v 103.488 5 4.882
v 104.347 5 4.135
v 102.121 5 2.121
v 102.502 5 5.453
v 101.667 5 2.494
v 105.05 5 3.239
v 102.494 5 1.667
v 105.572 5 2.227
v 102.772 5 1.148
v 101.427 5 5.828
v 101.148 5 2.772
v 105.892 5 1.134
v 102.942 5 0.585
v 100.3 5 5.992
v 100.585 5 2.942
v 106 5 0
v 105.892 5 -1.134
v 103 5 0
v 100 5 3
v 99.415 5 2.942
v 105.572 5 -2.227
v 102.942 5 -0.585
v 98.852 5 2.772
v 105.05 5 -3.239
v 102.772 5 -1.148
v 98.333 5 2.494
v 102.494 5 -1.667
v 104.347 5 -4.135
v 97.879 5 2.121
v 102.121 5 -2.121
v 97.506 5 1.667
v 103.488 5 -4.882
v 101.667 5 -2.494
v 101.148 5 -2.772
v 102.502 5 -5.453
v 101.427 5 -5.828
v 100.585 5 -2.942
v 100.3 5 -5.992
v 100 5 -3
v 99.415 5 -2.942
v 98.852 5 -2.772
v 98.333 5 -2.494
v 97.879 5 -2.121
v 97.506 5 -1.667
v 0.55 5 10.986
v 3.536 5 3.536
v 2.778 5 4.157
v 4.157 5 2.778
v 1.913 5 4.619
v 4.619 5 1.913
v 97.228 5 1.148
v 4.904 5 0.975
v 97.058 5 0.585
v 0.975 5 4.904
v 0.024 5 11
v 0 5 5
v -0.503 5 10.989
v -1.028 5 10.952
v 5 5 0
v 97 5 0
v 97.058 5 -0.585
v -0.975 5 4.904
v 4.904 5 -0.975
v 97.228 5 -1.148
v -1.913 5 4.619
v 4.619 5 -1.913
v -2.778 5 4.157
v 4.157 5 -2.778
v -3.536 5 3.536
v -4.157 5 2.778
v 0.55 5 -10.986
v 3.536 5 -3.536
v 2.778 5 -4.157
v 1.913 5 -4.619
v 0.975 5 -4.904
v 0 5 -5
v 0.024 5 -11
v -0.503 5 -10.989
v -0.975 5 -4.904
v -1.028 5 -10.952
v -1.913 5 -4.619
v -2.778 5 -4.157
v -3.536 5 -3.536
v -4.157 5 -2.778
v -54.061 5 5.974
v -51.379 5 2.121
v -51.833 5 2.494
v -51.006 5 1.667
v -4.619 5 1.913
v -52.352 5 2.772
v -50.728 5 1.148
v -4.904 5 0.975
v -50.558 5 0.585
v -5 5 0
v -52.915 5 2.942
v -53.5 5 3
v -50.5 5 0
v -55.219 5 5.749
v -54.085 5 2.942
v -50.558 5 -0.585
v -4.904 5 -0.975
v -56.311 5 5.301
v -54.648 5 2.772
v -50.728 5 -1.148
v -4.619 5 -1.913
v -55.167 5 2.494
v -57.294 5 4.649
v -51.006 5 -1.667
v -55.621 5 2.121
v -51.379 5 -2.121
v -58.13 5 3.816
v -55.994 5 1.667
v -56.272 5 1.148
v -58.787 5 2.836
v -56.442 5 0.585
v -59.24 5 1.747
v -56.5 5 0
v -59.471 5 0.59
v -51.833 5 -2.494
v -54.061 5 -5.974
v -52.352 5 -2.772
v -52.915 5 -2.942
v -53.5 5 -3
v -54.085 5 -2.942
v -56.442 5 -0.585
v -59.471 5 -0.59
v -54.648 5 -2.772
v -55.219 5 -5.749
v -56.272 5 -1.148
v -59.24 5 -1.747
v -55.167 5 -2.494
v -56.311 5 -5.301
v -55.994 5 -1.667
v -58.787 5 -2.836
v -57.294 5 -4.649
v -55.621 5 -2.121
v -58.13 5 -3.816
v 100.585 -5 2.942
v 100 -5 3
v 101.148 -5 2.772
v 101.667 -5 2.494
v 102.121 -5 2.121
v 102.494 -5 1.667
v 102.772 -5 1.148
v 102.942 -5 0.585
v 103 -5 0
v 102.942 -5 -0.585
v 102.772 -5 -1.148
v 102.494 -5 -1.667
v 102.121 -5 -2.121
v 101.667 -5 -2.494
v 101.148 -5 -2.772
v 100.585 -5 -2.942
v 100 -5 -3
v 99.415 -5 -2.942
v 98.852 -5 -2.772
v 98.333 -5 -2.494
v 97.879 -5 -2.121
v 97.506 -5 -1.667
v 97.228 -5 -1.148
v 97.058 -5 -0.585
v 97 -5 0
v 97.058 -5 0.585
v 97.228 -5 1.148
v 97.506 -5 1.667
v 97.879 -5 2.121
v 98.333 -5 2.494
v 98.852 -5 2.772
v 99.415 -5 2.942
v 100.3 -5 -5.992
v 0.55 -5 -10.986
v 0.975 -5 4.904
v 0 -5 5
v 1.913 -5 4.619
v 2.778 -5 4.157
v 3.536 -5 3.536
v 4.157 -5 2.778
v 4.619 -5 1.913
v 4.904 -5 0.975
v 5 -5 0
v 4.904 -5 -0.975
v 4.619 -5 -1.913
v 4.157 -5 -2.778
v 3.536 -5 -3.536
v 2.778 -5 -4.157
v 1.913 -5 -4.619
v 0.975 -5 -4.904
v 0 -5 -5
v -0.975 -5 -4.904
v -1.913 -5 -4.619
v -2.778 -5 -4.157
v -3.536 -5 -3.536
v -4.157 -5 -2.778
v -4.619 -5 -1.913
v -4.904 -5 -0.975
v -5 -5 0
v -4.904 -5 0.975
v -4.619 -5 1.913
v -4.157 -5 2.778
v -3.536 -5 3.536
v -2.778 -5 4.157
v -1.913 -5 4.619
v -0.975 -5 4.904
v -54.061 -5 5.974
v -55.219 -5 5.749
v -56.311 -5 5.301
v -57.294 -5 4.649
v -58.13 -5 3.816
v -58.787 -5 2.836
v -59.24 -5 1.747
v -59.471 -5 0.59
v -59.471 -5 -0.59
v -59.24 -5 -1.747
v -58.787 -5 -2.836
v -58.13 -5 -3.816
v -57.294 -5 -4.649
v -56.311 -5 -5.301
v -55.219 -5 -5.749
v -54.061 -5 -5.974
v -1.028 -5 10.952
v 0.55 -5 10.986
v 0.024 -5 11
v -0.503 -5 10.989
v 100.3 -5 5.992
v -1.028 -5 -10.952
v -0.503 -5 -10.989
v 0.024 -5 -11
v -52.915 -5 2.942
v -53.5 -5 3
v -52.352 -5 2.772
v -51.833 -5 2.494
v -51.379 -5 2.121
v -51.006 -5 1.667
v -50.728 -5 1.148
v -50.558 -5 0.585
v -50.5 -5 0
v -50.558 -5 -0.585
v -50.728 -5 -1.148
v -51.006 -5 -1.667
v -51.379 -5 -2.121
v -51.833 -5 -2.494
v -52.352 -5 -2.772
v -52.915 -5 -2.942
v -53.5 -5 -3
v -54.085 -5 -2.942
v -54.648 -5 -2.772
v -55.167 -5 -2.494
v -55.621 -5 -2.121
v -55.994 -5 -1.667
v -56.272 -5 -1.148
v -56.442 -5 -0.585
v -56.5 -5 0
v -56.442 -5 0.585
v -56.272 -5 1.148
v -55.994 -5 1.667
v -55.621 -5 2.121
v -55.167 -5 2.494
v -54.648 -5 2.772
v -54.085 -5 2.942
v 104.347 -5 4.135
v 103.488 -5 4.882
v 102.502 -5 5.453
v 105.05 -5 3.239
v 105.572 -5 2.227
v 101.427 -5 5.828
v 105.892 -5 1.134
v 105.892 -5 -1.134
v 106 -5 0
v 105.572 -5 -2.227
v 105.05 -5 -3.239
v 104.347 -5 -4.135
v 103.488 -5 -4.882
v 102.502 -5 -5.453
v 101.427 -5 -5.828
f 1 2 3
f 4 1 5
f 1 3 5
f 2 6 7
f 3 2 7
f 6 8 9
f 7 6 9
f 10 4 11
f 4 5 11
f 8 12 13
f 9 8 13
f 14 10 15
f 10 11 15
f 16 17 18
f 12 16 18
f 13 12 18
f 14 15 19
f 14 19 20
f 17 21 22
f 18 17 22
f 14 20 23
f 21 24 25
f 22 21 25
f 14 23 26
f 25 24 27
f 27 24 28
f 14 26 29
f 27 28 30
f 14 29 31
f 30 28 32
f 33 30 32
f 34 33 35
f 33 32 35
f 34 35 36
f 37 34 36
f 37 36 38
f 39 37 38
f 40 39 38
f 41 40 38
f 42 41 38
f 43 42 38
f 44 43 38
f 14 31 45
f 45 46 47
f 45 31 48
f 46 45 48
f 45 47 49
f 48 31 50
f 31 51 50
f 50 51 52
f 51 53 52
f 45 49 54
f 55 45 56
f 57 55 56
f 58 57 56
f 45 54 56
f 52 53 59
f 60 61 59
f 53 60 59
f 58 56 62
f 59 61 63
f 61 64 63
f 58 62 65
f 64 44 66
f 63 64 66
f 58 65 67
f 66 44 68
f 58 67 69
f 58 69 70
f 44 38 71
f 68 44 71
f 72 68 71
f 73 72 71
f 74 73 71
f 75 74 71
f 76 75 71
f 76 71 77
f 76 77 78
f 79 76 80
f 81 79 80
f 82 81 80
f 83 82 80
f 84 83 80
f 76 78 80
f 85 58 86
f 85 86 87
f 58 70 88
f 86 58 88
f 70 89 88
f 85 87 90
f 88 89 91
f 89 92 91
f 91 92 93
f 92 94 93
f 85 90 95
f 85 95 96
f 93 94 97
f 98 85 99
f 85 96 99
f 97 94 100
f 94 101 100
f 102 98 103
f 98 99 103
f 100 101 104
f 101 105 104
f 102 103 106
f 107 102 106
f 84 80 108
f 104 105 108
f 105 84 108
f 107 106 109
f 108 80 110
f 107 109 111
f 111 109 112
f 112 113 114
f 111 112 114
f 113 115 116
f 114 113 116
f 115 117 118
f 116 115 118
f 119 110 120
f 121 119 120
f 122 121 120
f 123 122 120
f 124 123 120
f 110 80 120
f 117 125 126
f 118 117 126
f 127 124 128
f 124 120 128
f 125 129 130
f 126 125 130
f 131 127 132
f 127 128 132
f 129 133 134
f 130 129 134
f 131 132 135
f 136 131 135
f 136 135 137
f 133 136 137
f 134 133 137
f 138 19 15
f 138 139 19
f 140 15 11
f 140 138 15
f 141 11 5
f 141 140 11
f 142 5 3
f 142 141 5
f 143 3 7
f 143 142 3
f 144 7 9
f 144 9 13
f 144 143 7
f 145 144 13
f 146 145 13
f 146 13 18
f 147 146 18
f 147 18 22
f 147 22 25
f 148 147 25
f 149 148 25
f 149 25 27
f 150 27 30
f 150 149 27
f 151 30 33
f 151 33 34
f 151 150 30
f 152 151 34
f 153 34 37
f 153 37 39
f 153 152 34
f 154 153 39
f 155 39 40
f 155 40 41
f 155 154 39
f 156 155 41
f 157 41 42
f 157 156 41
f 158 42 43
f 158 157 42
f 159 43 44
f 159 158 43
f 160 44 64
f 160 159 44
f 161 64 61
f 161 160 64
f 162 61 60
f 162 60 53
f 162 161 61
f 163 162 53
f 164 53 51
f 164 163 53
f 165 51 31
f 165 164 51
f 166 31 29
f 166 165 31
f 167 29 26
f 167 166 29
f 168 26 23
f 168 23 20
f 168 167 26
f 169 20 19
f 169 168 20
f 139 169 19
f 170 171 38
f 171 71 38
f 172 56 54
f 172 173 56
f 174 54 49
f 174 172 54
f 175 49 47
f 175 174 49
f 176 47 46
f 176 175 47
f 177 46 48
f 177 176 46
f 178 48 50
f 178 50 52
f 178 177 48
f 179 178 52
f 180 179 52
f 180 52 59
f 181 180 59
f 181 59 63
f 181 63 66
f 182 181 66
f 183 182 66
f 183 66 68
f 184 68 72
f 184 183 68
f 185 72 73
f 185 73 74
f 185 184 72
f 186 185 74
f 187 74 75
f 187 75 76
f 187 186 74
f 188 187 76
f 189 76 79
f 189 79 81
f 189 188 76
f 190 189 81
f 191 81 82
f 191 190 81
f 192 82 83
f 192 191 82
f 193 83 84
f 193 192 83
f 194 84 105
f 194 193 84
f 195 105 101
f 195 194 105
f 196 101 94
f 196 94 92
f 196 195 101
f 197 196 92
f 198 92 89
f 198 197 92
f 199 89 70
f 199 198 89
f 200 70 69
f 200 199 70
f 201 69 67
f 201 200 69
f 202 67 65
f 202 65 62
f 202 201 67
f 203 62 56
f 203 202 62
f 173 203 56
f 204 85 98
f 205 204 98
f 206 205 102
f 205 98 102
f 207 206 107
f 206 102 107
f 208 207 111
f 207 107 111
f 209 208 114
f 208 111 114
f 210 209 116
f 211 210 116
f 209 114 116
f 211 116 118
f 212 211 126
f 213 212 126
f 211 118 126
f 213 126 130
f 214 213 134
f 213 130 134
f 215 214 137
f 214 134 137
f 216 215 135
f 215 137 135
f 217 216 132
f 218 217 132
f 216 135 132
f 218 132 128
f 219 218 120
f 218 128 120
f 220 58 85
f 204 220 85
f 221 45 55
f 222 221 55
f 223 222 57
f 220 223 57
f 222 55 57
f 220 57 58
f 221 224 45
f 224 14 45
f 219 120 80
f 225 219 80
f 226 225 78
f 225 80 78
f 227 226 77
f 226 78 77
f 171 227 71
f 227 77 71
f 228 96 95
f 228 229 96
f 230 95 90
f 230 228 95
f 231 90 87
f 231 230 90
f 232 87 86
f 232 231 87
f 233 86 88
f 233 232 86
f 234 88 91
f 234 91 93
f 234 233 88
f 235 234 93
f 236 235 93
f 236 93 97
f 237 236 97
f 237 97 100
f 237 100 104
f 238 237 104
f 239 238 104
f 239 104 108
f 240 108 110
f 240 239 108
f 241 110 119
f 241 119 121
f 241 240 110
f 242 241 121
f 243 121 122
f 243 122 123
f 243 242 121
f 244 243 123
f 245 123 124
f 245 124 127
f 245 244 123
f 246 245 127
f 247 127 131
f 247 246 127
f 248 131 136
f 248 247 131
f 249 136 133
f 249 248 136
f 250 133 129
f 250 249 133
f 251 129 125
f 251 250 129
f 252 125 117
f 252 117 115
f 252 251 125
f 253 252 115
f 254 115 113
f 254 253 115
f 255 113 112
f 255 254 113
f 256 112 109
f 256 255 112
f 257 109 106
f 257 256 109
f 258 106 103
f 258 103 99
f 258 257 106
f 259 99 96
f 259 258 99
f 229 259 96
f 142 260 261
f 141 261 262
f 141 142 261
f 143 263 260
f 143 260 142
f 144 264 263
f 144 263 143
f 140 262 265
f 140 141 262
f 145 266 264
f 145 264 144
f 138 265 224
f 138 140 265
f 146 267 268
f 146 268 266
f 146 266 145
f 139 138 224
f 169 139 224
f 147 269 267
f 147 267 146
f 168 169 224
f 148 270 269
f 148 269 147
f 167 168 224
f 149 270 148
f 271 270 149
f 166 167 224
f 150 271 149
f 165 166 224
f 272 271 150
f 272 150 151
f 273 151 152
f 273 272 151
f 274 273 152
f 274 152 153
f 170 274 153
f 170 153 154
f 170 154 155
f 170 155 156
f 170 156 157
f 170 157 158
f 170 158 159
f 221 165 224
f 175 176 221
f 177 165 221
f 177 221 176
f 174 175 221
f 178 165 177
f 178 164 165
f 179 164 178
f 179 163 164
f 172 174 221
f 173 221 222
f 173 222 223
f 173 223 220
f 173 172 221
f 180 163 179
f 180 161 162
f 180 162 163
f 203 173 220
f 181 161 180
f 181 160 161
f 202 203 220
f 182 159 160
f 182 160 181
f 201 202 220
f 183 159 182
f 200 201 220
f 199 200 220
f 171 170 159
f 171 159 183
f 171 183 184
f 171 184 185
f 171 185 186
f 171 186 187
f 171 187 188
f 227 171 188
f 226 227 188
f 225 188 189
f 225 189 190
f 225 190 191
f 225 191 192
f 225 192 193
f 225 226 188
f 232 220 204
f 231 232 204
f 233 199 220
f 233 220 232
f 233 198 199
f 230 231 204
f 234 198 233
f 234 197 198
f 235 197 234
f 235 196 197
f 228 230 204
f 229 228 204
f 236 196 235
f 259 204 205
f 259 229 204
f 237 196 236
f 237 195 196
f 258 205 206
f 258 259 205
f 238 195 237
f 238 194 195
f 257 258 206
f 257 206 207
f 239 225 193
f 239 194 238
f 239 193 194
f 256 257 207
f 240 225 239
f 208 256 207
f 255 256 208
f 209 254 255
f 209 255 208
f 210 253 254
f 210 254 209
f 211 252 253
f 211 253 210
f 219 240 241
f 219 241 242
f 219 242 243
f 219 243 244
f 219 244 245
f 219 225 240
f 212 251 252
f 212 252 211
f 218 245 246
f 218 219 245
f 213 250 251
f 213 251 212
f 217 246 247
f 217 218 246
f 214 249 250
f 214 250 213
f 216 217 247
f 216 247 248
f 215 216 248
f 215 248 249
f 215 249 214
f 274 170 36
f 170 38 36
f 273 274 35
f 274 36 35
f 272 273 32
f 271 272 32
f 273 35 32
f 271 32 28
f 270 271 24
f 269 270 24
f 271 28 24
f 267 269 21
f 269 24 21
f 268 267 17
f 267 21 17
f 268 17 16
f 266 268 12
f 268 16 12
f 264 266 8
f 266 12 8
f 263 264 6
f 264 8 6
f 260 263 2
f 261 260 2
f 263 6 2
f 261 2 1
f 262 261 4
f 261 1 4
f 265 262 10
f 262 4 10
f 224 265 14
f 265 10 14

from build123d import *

# Parameters (mm, degrees)
SKETCH_1_R      = 3
SKETCH_1_R_2    = 5
EXTRUDE_1_DEPTH = 5


with BuildPart() as part:
    # 草图1 → 凸台-拉伸1 (new, symmetric)
    with BuildSketch(Plane(origin=(0, 0, 0), x_dir=(1, 0, 0), z_dir=(0, 1, 0))):
        with BuildLine():
            Line((-54.060747664, 5.97373937), (-1.028037383, 10.951855511))
            ThreePointArc((-1.028037383, 10.951855511), (-0.23963625, 10.997389439), (0.55, 10.986241395))
            Line((0.55, 10.986241395), (100.3, 5.992495307))
            ThreePointArc((100.3, 5.992495307), (106, 0), (100.3, -5.992495307))
            Line((100.3, -5.992495307), (0.55, -10.986241395))
            ThreePointArc((0.55, -10.986241395), (-0.23963625, -10.997389439), (-1.028037383, -10.951855511))
            Line((-1.028037383, -10.951855511), (-54.060747664, -5.97373937))
            ThreePointArc((-54.060747664, -5.97373937), (-59.5, 0), (-54.060747664, 5.97373937))
        make_face()
        with Locations(Location((-53.5, 0, 0), (0, 0, 270))):
            Circle(SKETCH_1_R, mode=Mode.SUBTRACT)
        with Locations(Location((100, 0, 0), (0, 0, 270))):
            Circle(SKETCH_1_R, mode=Mode.SUBTRACT)
        with Locations(Location((0, 0, 0), (0, 0, 270))):
            Circle(SKETCH_1_R_2, mode=Mode.SUBTRACT)
    extrude(amount=EXTRUDE_1_DEPTH, both=True)


solid = part.part
